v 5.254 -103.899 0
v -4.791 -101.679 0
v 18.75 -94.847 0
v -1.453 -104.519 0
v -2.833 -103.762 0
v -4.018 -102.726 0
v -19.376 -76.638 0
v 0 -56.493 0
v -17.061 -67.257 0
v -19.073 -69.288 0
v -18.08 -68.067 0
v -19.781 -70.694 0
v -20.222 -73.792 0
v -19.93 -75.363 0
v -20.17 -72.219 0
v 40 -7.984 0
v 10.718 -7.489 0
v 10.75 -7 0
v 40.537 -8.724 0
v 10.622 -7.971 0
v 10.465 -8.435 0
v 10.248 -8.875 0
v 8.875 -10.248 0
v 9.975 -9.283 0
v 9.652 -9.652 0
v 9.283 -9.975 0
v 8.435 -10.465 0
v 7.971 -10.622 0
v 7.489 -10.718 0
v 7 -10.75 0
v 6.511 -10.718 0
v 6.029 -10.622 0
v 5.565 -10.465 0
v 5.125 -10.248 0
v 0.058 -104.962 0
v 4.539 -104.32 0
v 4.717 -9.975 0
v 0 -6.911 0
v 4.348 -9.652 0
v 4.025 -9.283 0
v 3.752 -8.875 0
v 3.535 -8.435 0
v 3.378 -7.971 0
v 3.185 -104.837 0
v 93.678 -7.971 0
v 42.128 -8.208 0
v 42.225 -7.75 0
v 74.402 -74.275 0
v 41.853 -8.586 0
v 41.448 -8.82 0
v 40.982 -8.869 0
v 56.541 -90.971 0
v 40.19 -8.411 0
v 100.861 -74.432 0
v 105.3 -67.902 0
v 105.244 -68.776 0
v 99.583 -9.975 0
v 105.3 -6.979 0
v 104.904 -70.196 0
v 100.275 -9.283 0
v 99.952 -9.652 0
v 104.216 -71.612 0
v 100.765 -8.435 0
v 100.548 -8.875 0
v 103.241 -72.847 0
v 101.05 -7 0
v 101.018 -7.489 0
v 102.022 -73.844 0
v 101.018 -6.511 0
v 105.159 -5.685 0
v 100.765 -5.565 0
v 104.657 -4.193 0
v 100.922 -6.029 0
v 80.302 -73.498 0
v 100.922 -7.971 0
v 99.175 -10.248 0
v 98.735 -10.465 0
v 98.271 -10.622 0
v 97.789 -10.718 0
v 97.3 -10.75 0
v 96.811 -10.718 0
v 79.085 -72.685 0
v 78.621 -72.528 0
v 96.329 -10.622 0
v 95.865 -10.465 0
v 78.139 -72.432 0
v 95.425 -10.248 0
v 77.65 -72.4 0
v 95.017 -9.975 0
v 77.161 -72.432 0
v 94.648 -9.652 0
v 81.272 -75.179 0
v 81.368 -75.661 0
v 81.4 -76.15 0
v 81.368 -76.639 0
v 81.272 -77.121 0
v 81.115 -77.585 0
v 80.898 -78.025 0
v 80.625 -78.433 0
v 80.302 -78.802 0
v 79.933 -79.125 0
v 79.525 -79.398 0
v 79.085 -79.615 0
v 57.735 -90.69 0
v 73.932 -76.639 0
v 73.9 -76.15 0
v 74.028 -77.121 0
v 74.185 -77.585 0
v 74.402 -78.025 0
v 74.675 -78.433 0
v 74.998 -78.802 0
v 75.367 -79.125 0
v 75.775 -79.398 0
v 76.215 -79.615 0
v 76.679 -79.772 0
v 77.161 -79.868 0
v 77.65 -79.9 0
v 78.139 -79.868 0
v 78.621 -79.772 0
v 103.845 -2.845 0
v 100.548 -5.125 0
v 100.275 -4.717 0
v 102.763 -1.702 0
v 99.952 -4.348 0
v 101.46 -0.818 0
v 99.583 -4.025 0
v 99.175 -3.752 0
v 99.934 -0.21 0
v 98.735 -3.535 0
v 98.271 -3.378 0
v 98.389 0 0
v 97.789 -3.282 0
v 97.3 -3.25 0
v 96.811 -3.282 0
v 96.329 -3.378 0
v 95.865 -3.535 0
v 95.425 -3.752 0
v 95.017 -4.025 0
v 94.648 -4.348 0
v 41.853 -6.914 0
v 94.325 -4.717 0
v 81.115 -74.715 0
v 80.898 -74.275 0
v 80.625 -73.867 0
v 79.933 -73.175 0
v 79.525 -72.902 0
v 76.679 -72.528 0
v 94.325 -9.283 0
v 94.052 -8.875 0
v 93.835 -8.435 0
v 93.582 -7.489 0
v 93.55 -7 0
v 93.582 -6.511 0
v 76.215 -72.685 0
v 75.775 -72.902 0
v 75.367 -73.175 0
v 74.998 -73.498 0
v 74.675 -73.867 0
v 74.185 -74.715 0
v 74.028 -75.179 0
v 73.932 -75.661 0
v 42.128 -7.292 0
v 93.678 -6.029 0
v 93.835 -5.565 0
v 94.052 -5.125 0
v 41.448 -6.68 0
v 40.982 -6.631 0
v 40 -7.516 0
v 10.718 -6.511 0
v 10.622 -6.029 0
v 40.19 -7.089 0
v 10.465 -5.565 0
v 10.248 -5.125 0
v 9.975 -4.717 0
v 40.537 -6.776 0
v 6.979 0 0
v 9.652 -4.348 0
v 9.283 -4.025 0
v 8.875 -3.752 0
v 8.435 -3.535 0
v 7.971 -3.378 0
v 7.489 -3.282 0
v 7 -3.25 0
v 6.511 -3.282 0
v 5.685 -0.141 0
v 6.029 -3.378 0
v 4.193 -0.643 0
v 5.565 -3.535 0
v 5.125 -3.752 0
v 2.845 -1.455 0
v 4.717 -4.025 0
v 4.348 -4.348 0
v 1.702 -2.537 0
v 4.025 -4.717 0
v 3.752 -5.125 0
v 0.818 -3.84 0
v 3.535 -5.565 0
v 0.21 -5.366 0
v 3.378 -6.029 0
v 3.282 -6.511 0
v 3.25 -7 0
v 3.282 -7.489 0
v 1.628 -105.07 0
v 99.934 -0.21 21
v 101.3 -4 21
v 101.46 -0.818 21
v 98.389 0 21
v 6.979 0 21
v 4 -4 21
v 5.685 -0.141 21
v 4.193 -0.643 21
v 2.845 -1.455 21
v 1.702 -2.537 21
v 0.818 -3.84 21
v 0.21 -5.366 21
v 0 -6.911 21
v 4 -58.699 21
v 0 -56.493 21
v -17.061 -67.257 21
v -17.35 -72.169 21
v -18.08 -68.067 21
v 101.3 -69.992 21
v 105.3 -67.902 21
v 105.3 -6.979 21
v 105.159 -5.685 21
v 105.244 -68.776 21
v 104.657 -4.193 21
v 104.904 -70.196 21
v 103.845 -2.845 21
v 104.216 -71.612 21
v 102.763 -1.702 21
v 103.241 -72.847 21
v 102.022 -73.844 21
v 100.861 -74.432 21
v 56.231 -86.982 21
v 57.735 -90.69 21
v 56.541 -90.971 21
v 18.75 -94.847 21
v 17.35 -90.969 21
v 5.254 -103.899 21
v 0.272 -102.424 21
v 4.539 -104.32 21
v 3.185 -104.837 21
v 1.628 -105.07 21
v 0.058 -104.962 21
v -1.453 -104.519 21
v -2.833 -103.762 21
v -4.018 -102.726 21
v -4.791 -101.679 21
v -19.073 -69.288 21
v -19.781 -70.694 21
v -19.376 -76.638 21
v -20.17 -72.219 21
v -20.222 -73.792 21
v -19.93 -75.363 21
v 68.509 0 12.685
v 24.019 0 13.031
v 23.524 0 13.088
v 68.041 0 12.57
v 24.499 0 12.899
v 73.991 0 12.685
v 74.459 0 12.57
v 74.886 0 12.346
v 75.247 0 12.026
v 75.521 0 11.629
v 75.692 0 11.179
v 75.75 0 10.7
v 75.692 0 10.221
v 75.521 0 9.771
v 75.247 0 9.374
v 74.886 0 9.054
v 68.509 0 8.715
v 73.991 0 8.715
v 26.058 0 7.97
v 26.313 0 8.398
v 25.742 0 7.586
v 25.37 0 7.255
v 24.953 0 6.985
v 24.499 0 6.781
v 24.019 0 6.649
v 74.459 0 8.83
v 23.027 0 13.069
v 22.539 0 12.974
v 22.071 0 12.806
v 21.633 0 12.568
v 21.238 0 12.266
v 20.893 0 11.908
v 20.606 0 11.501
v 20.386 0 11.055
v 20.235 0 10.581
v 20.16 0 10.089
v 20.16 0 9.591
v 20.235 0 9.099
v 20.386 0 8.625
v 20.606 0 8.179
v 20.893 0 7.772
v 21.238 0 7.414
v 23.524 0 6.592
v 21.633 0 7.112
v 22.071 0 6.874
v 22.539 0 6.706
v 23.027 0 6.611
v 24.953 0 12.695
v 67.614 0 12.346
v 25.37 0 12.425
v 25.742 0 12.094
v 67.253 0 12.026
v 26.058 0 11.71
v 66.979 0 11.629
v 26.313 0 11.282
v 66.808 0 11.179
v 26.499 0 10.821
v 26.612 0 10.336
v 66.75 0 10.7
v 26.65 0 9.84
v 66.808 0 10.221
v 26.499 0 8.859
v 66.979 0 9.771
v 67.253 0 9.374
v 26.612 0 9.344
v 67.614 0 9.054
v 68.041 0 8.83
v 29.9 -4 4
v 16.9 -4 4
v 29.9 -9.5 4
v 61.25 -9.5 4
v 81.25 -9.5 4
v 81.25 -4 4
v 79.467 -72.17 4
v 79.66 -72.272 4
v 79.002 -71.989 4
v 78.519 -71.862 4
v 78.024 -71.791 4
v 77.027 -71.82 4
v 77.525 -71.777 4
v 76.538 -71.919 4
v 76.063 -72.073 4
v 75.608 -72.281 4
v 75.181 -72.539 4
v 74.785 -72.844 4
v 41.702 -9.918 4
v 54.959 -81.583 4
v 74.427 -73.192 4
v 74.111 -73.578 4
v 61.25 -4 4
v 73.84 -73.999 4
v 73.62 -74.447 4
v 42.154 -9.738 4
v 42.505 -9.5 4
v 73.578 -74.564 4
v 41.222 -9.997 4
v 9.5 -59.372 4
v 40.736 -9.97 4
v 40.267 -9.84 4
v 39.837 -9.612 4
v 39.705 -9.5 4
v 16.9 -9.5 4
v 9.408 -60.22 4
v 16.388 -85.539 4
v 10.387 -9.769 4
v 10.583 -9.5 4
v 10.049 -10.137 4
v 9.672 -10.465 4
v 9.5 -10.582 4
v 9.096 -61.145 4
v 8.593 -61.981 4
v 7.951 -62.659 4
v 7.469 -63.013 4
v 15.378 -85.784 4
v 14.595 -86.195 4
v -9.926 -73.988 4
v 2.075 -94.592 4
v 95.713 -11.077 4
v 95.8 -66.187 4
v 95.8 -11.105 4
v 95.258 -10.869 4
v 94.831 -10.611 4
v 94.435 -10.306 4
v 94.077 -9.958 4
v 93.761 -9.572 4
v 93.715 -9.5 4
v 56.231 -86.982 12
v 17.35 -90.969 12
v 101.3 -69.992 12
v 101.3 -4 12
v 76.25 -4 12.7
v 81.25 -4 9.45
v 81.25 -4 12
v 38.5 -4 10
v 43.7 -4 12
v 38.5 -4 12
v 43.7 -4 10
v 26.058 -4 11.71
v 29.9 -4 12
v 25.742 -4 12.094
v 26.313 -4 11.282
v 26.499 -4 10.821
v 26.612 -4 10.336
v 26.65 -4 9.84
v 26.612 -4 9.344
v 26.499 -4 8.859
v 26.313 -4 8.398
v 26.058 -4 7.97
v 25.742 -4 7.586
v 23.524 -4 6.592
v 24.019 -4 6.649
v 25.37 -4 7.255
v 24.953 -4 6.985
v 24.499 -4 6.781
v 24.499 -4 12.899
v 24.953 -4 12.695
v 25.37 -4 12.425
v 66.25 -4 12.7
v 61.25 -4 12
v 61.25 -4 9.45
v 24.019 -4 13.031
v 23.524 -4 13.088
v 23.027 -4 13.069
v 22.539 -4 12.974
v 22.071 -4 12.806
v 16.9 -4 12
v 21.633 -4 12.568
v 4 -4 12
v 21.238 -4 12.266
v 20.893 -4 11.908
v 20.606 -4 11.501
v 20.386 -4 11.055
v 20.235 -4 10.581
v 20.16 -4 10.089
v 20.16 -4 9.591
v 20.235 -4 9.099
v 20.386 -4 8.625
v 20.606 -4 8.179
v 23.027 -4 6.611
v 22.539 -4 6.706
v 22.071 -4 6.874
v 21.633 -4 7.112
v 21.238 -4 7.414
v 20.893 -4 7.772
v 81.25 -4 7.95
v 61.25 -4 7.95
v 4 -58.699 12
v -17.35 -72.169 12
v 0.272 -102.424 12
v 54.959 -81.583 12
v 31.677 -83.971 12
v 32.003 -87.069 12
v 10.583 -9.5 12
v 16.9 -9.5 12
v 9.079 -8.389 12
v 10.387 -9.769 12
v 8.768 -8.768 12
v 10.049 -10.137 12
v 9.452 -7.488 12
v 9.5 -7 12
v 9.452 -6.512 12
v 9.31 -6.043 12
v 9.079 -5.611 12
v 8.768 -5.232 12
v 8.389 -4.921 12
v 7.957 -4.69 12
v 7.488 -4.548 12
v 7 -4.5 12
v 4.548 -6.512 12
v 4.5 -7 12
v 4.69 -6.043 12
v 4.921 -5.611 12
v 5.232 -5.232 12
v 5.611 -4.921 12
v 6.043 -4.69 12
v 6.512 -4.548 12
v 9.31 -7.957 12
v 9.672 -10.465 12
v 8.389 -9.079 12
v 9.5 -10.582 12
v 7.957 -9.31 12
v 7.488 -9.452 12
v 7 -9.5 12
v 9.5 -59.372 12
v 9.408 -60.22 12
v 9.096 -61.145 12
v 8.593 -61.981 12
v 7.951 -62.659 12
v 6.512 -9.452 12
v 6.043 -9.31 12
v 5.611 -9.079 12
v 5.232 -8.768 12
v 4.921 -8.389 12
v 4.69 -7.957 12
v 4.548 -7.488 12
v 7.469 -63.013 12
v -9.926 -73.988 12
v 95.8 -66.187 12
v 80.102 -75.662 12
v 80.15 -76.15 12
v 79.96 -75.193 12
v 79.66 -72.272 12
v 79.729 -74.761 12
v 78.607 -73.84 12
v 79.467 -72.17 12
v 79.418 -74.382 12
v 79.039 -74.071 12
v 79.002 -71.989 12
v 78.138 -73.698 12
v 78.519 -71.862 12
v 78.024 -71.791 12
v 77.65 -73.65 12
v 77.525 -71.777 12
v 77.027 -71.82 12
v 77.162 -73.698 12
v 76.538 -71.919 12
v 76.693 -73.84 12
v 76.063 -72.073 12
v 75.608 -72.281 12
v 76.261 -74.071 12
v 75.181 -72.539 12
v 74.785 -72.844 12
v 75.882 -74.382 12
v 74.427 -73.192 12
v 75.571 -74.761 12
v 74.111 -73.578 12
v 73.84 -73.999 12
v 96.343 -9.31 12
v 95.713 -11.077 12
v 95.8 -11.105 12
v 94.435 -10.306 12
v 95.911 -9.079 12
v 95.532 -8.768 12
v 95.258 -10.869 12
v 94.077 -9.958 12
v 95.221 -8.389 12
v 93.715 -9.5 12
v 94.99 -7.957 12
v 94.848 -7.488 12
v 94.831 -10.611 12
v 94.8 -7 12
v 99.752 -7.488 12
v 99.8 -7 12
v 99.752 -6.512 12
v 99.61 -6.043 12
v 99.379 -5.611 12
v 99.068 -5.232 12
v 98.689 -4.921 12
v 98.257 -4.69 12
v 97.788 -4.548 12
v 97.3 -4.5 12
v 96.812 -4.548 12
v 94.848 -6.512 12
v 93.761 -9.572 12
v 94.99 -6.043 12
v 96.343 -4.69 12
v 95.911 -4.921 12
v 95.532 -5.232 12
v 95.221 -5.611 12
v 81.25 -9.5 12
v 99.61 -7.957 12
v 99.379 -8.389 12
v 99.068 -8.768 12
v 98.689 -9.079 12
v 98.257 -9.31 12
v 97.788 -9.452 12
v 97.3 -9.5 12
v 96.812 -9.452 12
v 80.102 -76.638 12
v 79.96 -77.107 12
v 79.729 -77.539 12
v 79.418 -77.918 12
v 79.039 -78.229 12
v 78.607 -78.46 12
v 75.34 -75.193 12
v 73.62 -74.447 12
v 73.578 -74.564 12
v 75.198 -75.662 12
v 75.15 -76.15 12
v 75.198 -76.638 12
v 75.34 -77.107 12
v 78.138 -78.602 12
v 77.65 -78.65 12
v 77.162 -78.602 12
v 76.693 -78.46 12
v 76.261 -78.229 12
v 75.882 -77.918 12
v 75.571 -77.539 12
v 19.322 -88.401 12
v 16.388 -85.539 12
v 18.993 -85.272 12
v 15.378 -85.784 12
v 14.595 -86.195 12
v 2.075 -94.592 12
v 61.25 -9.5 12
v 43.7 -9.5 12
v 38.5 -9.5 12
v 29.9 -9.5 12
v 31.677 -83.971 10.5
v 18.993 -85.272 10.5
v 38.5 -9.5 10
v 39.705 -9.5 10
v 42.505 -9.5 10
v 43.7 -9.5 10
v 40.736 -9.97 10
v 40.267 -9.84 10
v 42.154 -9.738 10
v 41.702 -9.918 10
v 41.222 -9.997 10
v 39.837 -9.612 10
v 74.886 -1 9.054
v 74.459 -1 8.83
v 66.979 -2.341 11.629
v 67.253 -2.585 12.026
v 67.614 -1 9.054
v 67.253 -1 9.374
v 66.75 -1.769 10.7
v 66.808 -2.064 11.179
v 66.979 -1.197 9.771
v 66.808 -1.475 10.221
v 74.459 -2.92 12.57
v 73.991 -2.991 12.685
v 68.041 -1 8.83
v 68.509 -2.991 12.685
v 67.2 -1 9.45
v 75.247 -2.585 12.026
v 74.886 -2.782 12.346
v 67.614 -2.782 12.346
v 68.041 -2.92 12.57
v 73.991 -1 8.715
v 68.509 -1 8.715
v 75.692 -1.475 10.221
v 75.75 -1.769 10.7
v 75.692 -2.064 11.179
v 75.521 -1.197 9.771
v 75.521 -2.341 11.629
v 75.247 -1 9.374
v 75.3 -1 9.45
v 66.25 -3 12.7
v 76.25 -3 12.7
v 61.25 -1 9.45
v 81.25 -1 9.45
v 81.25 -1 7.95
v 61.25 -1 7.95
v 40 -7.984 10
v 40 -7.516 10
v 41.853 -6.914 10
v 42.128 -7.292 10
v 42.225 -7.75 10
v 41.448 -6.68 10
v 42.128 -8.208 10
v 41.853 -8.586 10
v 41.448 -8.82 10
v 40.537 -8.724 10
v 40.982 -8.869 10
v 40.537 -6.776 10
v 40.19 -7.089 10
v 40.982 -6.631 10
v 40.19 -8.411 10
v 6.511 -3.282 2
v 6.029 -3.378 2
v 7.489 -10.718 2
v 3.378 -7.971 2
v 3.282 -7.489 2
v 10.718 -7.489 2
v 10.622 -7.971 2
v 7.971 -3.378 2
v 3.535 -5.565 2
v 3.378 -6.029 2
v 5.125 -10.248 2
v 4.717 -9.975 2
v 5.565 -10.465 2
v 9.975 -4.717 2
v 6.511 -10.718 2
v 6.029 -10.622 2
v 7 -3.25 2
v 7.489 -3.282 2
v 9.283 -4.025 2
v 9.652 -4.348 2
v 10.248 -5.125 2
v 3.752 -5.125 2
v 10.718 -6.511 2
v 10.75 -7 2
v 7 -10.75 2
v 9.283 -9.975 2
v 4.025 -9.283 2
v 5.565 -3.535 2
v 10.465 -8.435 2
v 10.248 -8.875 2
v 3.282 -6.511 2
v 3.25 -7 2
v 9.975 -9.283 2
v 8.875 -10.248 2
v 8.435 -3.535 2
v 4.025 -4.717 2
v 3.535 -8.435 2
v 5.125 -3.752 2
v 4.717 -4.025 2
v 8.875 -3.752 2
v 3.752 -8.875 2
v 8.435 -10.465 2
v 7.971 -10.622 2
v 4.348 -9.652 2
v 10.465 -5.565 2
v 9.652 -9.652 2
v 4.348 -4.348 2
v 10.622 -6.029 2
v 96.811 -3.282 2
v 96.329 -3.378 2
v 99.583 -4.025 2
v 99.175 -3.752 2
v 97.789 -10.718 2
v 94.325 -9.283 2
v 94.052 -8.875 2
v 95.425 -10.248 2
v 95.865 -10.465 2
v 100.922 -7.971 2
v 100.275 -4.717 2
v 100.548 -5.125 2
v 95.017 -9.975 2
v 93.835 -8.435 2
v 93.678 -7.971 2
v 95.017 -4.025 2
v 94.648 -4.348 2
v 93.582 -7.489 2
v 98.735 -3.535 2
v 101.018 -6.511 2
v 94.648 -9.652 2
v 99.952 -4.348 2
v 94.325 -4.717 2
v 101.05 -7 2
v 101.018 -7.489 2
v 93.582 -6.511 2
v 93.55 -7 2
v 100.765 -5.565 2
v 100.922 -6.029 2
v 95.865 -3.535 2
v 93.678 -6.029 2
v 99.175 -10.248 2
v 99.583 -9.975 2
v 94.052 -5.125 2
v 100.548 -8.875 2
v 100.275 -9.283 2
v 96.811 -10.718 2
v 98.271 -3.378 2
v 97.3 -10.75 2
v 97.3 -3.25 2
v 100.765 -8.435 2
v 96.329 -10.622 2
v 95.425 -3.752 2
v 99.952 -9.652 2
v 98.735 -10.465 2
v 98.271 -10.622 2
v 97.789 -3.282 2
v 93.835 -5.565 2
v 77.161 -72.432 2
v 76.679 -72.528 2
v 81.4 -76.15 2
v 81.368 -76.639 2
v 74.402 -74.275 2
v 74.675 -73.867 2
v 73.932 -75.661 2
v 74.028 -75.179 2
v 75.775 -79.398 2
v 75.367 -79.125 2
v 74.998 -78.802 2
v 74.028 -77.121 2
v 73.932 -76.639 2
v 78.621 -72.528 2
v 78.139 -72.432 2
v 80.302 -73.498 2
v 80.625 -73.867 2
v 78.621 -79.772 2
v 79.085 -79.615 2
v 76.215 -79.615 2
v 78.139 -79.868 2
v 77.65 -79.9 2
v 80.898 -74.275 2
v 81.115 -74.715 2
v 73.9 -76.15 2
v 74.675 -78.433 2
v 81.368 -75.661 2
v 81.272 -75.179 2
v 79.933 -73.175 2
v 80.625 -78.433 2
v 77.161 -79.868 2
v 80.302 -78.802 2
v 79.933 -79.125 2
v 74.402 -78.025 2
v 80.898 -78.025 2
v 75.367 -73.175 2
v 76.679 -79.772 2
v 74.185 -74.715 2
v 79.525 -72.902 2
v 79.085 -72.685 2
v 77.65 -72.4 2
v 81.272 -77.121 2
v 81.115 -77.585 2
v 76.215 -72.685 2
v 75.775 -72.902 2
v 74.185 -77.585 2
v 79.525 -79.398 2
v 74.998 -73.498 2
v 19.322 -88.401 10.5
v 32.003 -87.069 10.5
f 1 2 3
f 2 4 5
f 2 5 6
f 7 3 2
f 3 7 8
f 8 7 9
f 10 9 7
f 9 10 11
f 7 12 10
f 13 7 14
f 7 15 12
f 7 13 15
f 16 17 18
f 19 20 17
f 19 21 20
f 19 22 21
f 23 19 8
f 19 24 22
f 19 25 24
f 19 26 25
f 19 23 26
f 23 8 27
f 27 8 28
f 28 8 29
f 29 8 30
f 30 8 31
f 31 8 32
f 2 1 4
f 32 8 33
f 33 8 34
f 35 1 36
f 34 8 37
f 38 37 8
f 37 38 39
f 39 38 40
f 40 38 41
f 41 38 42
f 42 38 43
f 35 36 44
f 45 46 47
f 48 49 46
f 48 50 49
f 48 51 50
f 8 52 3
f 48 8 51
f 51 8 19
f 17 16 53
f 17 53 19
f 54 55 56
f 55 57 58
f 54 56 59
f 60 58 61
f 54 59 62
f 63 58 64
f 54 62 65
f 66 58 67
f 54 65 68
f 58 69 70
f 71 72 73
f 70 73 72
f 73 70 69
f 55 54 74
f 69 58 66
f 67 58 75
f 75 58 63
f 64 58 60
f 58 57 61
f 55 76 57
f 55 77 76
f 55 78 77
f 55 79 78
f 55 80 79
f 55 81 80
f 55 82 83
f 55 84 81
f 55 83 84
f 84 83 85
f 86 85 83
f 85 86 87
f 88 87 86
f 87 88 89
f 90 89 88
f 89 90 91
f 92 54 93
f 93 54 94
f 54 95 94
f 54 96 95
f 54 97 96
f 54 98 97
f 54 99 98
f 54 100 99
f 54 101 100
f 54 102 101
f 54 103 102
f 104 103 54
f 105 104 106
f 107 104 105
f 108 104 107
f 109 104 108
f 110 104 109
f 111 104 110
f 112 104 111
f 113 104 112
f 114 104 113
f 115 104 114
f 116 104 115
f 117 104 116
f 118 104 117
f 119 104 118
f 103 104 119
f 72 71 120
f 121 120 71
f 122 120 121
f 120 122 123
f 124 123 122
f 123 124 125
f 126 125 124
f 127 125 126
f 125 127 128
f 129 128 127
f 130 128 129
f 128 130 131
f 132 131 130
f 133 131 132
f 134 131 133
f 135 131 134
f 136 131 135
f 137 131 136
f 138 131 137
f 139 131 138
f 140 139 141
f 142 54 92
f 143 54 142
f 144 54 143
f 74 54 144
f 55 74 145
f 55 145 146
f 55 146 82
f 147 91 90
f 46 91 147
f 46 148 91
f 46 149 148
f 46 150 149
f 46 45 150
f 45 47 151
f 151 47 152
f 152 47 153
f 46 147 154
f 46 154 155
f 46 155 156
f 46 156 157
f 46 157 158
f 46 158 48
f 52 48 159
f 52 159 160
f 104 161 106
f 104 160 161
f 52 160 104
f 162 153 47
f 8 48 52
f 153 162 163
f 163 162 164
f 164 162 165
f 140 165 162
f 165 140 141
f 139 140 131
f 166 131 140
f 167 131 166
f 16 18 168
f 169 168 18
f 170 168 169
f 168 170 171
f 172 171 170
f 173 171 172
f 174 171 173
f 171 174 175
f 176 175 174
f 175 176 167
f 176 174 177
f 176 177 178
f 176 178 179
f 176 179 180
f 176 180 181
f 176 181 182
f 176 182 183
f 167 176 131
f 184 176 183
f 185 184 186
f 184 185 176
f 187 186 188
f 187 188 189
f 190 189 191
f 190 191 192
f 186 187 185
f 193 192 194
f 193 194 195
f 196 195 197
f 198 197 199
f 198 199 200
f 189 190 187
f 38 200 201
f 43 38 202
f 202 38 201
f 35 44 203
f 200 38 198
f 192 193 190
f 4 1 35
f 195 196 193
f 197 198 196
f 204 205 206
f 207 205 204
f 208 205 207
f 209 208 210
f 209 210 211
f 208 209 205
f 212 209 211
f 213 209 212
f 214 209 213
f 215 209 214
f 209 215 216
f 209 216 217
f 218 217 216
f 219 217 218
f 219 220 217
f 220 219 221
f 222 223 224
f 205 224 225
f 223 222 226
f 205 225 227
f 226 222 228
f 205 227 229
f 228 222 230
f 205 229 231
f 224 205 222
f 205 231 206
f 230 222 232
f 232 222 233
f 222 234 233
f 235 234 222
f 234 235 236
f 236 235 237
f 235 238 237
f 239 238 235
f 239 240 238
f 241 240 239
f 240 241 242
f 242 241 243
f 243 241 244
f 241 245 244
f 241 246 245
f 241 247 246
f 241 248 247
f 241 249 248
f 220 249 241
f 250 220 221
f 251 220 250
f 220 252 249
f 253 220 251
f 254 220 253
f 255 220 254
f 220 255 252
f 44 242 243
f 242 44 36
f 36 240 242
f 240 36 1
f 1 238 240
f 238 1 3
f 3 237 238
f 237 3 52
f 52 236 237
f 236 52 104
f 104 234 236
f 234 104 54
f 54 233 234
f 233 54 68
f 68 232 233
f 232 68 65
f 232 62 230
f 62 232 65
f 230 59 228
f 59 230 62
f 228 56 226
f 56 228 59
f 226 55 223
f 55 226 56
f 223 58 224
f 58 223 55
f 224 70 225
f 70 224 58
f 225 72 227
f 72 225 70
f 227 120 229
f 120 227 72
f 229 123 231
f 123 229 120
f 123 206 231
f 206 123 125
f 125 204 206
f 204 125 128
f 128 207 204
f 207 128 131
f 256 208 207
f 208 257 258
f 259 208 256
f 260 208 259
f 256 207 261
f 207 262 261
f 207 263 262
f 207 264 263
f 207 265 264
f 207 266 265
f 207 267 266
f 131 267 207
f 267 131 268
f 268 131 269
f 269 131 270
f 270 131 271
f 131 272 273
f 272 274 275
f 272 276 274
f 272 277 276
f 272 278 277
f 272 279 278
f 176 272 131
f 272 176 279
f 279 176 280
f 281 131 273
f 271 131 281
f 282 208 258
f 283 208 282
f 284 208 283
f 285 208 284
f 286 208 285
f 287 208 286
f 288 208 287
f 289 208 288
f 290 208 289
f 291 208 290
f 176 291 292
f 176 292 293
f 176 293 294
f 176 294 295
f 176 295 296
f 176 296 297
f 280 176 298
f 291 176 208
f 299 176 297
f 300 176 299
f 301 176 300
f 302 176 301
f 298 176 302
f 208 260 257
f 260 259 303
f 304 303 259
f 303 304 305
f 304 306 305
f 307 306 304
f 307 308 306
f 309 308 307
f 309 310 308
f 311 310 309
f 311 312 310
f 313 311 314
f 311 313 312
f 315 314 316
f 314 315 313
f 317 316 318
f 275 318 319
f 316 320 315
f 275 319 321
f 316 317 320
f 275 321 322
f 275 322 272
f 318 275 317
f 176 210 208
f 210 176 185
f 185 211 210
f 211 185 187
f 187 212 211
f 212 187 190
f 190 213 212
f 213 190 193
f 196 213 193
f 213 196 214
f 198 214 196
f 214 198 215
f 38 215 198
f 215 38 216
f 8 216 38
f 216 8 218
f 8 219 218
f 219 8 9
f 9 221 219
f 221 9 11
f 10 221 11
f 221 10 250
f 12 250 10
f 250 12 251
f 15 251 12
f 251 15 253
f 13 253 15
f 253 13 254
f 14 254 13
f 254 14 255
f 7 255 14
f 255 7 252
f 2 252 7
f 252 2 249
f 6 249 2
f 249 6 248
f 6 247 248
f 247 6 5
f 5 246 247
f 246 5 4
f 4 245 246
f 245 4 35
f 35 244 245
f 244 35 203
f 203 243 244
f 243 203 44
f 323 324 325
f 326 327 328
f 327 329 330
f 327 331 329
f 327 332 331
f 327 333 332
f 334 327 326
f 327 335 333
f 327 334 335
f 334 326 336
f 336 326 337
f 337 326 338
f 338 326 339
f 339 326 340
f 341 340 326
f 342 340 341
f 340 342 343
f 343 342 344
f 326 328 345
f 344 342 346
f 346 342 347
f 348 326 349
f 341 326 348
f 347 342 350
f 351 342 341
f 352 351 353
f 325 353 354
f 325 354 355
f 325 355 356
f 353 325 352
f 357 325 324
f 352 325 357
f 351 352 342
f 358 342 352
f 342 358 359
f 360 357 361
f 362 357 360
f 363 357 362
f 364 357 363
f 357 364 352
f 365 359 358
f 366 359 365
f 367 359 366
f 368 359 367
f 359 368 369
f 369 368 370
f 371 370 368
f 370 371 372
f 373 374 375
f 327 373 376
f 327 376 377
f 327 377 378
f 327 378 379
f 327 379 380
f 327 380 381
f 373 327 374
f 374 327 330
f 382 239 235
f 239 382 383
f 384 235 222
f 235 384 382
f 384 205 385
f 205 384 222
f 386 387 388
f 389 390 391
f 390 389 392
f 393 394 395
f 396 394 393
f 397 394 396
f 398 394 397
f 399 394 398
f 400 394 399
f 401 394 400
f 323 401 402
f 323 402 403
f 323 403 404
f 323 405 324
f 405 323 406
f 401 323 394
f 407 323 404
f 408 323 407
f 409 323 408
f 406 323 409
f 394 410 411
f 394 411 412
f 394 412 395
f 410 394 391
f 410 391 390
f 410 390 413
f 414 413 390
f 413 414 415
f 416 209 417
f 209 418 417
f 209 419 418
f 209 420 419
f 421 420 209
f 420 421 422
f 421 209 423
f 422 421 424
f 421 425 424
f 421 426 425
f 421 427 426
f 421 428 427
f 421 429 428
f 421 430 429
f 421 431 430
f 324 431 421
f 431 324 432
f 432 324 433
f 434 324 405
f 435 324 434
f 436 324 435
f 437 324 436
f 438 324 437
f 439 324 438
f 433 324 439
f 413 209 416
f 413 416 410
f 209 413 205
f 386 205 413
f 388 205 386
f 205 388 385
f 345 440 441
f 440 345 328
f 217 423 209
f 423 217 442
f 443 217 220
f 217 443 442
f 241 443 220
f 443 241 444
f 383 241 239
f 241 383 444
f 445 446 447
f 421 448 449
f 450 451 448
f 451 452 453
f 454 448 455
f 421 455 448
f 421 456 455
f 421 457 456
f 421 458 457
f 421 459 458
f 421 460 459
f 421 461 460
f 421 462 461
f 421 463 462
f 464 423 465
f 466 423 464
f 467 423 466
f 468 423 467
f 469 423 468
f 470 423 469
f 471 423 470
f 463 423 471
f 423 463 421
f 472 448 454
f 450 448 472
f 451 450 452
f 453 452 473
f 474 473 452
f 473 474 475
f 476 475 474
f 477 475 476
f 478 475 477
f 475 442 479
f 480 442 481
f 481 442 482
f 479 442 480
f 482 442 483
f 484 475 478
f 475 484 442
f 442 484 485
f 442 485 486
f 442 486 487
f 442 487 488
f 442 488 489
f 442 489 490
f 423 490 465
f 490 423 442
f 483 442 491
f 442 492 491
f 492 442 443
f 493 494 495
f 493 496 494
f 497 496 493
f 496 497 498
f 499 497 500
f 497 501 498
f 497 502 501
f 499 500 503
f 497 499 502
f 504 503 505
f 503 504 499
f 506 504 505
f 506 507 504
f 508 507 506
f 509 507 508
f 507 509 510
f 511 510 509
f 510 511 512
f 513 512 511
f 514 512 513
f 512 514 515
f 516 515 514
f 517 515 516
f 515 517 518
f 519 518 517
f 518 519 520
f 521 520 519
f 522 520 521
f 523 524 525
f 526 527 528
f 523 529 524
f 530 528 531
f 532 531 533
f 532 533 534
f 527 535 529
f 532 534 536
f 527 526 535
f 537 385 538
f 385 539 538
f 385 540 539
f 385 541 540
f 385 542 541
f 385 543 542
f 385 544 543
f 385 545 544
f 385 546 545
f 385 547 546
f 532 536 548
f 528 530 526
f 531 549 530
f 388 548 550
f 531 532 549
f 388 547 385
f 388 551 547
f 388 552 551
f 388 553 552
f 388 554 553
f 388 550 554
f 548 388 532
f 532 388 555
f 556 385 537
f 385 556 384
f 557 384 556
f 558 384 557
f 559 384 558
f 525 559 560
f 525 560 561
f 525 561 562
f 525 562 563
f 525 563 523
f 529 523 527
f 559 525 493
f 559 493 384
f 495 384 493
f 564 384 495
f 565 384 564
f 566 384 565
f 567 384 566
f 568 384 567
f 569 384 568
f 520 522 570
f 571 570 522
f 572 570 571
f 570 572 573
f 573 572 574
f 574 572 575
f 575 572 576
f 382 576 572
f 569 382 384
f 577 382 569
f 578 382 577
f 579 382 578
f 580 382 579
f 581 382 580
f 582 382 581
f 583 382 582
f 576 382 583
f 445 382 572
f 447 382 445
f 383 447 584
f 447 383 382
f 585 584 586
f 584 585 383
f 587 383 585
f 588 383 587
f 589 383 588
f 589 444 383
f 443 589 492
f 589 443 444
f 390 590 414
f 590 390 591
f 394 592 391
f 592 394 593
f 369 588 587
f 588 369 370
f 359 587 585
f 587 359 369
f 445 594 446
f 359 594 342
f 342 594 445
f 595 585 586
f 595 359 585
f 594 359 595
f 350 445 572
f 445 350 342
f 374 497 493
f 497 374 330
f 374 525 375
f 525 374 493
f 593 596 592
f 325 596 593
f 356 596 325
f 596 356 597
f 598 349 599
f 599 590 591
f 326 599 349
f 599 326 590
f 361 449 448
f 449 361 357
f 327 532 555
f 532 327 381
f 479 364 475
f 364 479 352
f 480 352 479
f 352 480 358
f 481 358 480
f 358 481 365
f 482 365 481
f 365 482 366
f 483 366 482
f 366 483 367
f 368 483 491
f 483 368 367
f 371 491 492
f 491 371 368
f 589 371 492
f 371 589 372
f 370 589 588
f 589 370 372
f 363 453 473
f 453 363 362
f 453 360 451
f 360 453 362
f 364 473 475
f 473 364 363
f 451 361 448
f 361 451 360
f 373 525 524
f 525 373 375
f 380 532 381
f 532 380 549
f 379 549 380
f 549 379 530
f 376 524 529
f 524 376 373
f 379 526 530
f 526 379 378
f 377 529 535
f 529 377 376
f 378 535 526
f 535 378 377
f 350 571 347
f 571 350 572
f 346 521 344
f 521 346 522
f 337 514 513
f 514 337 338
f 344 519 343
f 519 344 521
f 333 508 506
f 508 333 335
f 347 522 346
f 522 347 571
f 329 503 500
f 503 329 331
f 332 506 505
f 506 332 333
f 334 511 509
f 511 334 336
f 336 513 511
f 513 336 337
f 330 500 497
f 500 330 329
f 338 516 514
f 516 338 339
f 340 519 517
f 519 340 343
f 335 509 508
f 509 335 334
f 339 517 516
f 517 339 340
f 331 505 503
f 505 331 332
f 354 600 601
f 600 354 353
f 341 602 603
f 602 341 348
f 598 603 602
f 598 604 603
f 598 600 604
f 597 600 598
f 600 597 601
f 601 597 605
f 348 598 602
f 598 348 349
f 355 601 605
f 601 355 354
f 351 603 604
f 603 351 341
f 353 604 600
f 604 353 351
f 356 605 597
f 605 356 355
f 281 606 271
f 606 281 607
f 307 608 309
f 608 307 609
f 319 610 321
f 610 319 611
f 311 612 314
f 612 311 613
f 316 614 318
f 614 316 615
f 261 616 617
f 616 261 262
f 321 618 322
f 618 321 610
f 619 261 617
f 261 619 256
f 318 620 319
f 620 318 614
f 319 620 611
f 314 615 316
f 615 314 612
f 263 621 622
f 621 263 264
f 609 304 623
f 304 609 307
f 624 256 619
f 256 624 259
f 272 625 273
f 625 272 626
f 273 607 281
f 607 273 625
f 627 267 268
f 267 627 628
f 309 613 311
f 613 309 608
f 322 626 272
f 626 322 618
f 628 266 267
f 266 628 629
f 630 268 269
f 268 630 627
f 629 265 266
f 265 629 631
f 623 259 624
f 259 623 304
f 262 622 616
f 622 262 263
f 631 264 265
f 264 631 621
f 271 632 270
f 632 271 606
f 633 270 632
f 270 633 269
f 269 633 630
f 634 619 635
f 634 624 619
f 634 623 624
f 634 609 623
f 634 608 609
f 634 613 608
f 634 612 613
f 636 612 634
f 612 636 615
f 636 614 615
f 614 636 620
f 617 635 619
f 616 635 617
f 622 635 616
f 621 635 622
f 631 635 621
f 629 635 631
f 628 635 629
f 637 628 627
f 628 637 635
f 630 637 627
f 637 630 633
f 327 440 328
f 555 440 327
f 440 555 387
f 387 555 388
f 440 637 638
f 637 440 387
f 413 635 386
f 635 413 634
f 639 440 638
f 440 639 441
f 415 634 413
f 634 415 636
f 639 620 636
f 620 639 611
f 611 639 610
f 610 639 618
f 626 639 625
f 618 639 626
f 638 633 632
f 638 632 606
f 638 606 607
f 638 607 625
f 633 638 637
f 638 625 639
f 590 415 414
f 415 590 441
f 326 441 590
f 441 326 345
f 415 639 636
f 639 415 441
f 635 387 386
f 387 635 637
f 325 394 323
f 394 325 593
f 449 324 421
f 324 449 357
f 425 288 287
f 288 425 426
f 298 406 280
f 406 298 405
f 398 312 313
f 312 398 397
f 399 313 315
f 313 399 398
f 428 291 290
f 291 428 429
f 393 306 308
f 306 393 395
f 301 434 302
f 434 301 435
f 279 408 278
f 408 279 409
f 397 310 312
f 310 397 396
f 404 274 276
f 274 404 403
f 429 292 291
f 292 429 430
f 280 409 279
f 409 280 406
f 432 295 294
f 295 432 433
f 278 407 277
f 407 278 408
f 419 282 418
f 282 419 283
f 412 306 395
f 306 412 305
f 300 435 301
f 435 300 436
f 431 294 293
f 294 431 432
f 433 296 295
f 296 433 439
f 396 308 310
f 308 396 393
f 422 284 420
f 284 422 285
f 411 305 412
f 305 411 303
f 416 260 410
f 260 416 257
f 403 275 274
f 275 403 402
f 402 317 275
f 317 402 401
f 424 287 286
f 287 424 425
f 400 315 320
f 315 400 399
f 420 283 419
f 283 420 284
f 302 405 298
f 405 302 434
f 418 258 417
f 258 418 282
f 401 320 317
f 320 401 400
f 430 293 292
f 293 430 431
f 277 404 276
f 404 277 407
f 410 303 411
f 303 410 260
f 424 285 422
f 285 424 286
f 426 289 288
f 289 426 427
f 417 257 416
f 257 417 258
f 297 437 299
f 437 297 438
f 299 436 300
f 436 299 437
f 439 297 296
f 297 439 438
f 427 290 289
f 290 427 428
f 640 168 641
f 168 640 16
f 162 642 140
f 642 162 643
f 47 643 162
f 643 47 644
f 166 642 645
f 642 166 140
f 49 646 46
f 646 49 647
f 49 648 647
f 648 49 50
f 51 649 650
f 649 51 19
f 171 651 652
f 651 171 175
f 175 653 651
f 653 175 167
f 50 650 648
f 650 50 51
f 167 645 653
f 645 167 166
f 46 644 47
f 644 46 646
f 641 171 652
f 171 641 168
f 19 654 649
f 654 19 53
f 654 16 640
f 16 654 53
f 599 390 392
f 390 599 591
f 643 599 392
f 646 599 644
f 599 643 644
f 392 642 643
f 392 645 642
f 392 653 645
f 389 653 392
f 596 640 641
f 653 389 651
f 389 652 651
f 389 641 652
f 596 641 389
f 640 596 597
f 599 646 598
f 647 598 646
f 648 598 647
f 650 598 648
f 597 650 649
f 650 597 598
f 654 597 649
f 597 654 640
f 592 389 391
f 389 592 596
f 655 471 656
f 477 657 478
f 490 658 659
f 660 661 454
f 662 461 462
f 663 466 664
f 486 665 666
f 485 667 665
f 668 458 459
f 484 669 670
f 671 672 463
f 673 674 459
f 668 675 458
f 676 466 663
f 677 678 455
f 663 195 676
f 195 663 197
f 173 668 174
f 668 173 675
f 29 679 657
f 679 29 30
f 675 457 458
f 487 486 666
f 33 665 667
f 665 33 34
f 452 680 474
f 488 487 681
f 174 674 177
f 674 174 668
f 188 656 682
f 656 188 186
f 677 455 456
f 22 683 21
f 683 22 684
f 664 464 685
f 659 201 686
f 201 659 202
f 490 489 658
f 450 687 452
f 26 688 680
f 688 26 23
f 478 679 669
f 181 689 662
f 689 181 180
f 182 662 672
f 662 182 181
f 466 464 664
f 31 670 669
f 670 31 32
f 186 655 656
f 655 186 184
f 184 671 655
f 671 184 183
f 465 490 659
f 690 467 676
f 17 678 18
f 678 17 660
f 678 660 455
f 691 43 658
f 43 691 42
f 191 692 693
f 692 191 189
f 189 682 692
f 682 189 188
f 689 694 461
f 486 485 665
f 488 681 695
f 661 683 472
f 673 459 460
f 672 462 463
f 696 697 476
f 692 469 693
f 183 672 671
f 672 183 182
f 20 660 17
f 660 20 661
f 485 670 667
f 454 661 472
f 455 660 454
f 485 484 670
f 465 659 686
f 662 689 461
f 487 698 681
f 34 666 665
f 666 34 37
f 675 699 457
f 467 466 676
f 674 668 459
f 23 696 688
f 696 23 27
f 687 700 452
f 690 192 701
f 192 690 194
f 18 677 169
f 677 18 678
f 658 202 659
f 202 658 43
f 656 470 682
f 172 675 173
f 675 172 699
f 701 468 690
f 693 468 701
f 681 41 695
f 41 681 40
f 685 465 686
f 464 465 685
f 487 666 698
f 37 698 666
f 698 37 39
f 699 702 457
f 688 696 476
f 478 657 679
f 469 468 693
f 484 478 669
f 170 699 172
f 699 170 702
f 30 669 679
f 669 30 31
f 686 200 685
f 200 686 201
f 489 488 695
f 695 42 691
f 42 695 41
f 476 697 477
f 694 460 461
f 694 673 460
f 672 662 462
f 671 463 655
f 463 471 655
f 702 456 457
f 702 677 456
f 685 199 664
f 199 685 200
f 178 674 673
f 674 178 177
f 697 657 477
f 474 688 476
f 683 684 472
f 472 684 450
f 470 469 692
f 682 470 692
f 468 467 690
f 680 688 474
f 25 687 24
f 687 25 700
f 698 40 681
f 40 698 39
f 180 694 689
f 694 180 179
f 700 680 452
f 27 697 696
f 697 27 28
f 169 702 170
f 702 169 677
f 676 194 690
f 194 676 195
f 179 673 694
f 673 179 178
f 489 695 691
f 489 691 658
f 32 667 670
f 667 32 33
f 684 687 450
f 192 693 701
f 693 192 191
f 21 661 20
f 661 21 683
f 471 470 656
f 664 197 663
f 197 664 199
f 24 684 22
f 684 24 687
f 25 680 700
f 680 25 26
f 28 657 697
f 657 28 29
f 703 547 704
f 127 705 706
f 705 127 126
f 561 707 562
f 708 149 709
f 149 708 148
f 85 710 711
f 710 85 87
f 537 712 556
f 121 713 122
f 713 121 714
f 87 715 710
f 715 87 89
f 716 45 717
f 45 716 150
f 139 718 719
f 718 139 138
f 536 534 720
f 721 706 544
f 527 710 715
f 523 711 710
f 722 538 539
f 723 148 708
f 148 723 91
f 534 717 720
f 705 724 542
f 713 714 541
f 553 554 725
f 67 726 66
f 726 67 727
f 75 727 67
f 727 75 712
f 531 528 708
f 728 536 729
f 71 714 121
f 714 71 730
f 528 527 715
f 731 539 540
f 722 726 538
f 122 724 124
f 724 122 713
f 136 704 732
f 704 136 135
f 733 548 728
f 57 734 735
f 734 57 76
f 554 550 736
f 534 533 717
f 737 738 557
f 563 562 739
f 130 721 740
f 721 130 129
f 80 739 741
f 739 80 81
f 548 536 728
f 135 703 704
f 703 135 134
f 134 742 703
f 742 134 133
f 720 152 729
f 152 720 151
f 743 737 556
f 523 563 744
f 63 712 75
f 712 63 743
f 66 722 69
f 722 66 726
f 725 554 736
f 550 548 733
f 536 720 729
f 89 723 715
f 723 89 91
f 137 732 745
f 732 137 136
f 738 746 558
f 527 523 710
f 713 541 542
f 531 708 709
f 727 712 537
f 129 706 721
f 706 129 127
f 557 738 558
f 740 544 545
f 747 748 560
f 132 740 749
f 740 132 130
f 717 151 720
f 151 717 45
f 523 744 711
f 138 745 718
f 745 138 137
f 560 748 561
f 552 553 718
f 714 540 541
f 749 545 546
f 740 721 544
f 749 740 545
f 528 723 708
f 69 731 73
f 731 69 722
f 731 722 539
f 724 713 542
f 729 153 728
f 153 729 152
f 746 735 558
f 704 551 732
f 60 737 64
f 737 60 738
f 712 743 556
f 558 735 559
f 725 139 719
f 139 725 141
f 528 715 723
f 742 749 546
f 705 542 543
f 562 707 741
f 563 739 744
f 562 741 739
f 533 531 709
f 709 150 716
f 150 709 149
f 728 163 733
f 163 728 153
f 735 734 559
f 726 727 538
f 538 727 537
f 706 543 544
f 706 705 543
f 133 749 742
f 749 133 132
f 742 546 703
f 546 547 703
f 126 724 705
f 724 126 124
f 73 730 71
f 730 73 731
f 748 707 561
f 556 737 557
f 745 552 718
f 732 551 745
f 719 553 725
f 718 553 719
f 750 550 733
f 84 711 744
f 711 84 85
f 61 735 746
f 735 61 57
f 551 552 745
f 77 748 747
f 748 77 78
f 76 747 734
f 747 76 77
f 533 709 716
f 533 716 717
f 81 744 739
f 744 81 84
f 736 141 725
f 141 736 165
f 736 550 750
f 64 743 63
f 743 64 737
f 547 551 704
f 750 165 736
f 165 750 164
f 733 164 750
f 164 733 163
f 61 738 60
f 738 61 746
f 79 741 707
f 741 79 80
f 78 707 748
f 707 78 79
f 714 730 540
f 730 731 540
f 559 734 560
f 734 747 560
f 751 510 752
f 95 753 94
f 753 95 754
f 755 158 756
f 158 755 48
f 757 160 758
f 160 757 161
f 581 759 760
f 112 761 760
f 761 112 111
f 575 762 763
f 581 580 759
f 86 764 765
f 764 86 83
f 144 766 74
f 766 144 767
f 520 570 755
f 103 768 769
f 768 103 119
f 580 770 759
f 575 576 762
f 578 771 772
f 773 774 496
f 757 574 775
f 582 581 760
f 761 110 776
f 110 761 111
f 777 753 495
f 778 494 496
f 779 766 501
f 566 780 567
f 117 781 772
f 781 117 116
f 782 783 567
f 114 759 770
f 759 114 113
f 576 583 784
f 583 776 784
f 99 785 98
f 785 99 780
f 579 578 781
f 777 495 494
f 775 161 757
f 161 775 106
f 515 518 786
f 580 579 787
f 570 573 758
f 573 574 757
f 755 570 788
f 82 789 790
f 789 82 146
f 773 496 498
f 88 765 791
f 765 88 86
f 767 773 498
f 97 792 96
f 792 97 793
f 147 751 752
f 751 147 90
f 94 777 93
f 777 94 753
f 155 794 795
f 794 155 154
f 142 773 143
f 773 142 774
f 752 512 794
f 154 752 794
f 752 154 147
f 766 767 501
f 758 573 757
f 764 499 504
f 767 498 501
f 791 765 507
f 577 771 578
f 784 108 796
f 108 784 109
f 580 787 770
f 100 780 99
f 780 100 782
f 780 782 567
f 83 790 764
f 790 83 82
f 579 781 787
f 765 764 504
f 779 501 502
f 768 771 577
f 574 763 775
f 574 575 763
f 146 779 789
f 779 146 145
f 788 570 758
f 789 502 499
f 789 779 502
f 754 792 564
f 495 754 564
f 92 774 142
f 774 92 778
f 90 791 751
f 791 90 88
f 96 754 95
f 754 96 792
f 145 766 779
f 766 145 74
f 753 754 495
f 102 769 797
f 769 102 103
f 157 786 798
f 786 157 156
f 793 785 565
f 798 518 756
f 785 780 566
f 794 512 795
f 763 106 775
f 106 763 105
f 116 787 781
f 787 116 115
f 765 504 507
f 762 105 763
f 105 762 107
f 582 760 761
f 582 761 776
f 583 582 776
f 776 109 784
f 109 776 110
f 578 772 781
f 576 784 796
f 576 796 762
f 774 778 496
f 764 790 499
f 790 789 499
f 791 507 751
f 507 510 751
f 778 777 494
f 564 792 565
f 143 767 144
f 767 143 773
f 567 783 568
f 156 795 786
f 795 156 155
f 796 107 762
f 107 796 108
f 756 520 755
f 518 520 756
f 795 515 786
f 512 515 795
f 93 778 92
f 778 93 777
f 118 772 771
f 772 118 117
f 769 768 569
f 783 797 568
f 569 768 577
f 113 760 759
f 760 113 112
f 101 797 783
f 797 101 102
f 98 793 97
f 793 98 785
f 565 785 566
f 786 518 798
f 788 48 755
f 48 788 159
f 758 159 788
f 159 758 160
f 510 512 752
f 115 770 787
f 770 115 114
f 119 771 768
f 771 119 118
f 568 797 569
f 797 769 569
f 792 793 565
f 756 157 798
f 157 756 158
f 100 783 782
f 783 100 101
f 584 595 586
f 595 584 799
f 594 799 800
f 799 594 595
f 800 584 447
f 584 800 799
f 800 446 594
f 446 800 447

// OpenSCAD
/******************************************************************************/
/*
  This file is part of the package minidox-case. It is subject to the
  license terms in the LICENSE file found in the top-level directory
  of this distribution and at:

    https://github.com/pjones/helping-mic

  No part of this package, including this file, may be copied, modified,
  propagated, or distributed except according to the terms contained in
  the LICENSE file.
*/

/******************************************************************************/
$fa = 1.0;
$fs = 0.5;

/******************************************************************************/
/*
  Note: All of the measurements in this file are for the RIGHT side.
  To generate the left side the model is mirrored in the X axis.
*/

/******************************************************************************/
// These are set from the command line:
print_side = "right";           /* right or left */
print_part = "case";            /* case, top, or cover */

/******************************************************************************/
// Optional features:
feature_cover = false;           /* Will you use a cover? */
feature_magnets = false;         /* Add holes to hold magnets? */

/******************************************************************************/
// Settings you may want to tweak:
inner_depth = 9.0;              /* How high the case will come up from the board upward. */
inner_spacing = 2.25;           /* Space under the board to hold it. */
outer_spacing = 1.0;            /* Extra space in the case for the board to fit in. */
cover_inner_space = 0.0;        /* Extra space in the cover for cables, etc. */
board_thickness = 1.6;          /* Thickness of circuit board. */
switch_height = 11.75;          /* Space between top of board and bottom of key cap */
cap_height = 7.90;              /* Height of keycap. */
bolt_size = [3.0, 16.0];        /* M3x16 */
bolt_inset = 2.5;               /* From wall to center of bolt. */
bolt_shaft_wall = 2.0;          /* Wall thickness of shaft bolt screws into. */
bolt_recess = 2.0;              /* How deep bolts go into the bottom. */

/******************************************************************************/
// If using magnets to hold the cover on, fill these out and add a
// small amount of extra so the magnet can go in easily.
//
// The exact measurements of the magnets I'm using are:
//   7.95mm x 2.80mm;
magnet_diameter = 8.25;         /* Magnet diameter. */
magnet_depth = 3.00;            /* Magnet depth. */

/******************************************************************************/
// I don't recommend changing these:
rounding = 2.25;                /* How much rounding to apply. */
thickness = 4;                  /* Wall thickness. */
board_overlap = 1.8;            /* Space around the board the top can sit on */

/******************************************************************************/
// Points that outline the desired case shape:
outline = [
  [0.00,     0.00],
  [95.30,    0.00],
  [95.30,  -64.30],
  [51.00,  -81.00],
  [12.00,  -85.00],
  [-4.40,  -96.00],
  [-21.00, -67.50],
  [0.00,   -54.25],
];

/******************************************************************************/
// Points that outline the shape to cut out of the top so the key caps
// can poke through:
cap_1U = [18.25, 18.25, 0.85, 0.85];
cap_2U = [cap_1U[0], 32.75, 0.85, 0.85];

rows = 3;
columns = 5;

function cap_over(keys) =
  /* Size of keycaps + Size of space between them */
  (cap_1U[0] * keys) + (cap_1U[2] * keys);

function cap_back(keys) =
  cap_over(columns) - (cap_over(keys - 1) + (keys == 1 ? 0 : cap_1U[2]));

function column_over(column, base) = lookup(column, [
    [ 1, -4.00 ],
    [ 2, -2.00 ],
    [ 3, -0.00 ],
    [ 4, -2.00 ],
    [ 5, -7.00 ],
  ]) + base;

// Position the entire cut out by placing the center of column in the
// center of the inner case.
cap_x_mid = max([for (i = outline) i[0] + outer_spacing])/2;
cap_x_start = cap_x_mid - (cap_over(3) - cap_1U[0]/2 - cap_1U[2]/2) - 0.25;

cap_y_upper = -0.25;
cap_y_lower = cap_y_upper + -(cap_1U[1] * rows + cap_1U[3] * rows);

top_cut = [
  // Upper half:
  [cap_x_start, column_over(1, cap_y_upper)], // Left of Y
  [cap_over(1), column_over(1, cap_y_upper)], // Left of U
  [cap_over(1), column_over(2, cap_y_upper)], // Left of U (moved up)
  [cap_over(2), column_over(2, cap_y_upper)], // Left of I
  [cap_over(2), column_over(3, cap_y_upper)], // Left of I (moved up)
  [cap_over(3), column_over(3, cap_y_upper)], // Left of O
  [cap_over(3), column_over(4, cap_y_upper)], // Left of O (moved down)
  [cap_over(4), column_over(4, cap_y_upper)], // Left of P
  [cap_over(4), column_over(5, cap_y_upper)], // Left of P (moved down)
  [cap_over(5), column_over(5, cap_y_upper)], // Right of P

  // Lower half:
  [cap_back(1), column_over(5, cap_y_lower)], // Right of /
  [cap_back(2), column_over(5, cap_y_lower)], // Left of /
  [cap_back(2), column_over(4, cap_y_lower)], // Left of / (moved up)
  [cap_back(3), column_over(4, cap_y_lower)], // Left of .
  [cap_back(3), column_over(3, cap_y_lower)], // Left of . (moved up)
  [cap_back(4), column_over(3, cap_y_lower)], // Right of M
  [cap_back(4), column_over(2, cap_y_lower)], // Right of M (moved down)
  [cap_back(5), column_over(2, cap_y_lower)], // Right of N
  [cap_back(5), column_over(1, cap_y_lower)], // Right of N (moved down)
  [cap_x_start, column_over(1, cap_y_lower)], // Left of N
];

// Now the three thumb keys:
thumb_3 = [ cap_x_mid - 7.40  // x offset (center of cap)
          , 71.35             // y offset (center of cap)
          , 0.00              // rotation (counterclockwise)
          ];

thumb_2 = [ thumb_3[0] - 21.25
          , thumb_3[1] + 2.40
          , 15.00
          ];

thumb_1 = [ thumb_2[0] - 24.00
          , thumb_2[1] + 2.30
          , 30.0
          ];

/******************************************************************************/
// Size of the pro micro body and TRRS jack.
//
// Elements:
//  - x size
//  - y size
//  - z size
//  - x offset to center of device
//  - z offset to center of device's opening measured from the bottom
//    of the circuit board to the center of the opening.
//
pro_micro = [ 20.0
            , 34.0
            , 6.0 // Used to set the inner height of the case.
            , 66.75
            , print_side == "right" ? 1.3 : 4.5
            ];

trrs = [ 13.0
       , 13.0
       , 5.23
       , 18.90
       , 2.16
       ];

/******************************************************************************/
// Other computed values:
board_to_caps = switch_height + cap_height;
wall_thickness_no_padding = feature_cover ? thickness * 2 : thickness;
wall_thickness = wall_thickness_no_padding + outer_spacing/2;
bolt_shaft = bolt_size[0] + bolt_shaft_wall;
shelf_width = inner_spacing + outer_spacing + rounding;

/******************************************************************************/
reset_button = [ 5.2            /* x */
               , shelf_width    /* y */
               , 2              /* z */
               , 36.6           /* center of x */
               , 3.25           /* center of y */
               , 2.25           /* diameter of reset hole */
               ];

/******************************************************************************/
// How high to make the shelf that the board sits on:
inner_height = pro_micro[2] + 2.0;
echo("INNER HEIGHT: ", inner_height);

/******************************************************************************/
// Full case height:
outer_height = inner_height + inner_depth;
echo("OUTER HEIGHT:", outer_height);

/******************************************************************************/
// How big the cover needs to be to enclose everything:
cover_inner_height =
  board_to_caps + board_thickness + // Everything from the shelf upwards
  thickness +                       // To include the top wall of the cover
  cover_inner_space -               // And extra space
  (inner_depth + thickness);        // Remove space used by case and top

echo("COVER INNER HEIGHT:", cover_inner_height);

/******************************************************************************/
// How big is the cover on the outside:
cover_outer_height = cover_inner_height + thickness + outer_height/2;
echo("COVER OUTER HEIGHT:", cover_outer_height);

/******************************************************************************/
case_width = max([ for (i = outline) i[0] ]) +
  ((outer_spacing + thickness)*2) +
  (feature_cover ? thickness*2 : 0);

case_y_width = min([ for (i = outline) i[1] ]) * -1;

cover_wall_height = outer_height/2 + thickness;

/******************************************************************************/
module cover_wall(height) {
  difference() {
    // The outer wall the case sits on.
    linear_extrude(height=height)
      offset(delta=outer_spacing + thickness*2)
      offset(r=+rounding) offset(delta=-rounding)
      polygon(points=outline);

    // Cut the wall off the back so device access isn't limited.
    translate([ case_width/2
              , thickness + outer_spacing + thickness/2
              , height/2
              ])
      cube([case_width*2, thickness, height+2], center=true);
  }
}

/******************************************************************************/
module outer_case() {
  difference() {
    union() {
      // Outer wall:
      linear_extrude(height=outer_height + thickness)
        offset(delta=outer_spacing + thickness)
        offset(r=+rounding) offset(delta=-rounding)
        polygon(points=outline);

      // Lower outer wall for case to sit on:
      if (feature_cover) cover_wall(cover_wall_height);
    }

    // Inner wall cutaway:
    translate([0, 0, thickness])
      linear_extrude(height=outer_height + thickness)
      offset(delta=outer_spacing)
      polygon(points=outline);
  }
}

/******************************************************************************/
module inner_case() {
  difference() {
    // Inside shelf:
    translate([0, 0, thickness])
      linear_extrude(height=inner_height)
      offset(delta=outer_spacing)
      polygon(points=outline);

    // Cut out most of the floor leaving the shelf:
    translate([0, 0, thickness])
      linear_extrude(height=inner_height)
      offset(delta=-inner_spacing)
      offset(r=-rounding)
      polygon(points=outline);
  }
}

/******************************************************************************/
// Carve out space for a device and its opening.
//
//  The opening shape should come in as a child and should have its
//  center on the z axis.  This assumes the opening is in the center
//  of the device.
module back_wall_device(dims) {
  center_x_offset = wall_thickness + dims[3];

  translate([ center_x_offset - dims[0]/2
            , -(dims[1] + wall_thickness_no_padding)
            , thickness
            ])
  cube([ dims[0]
       , dims[1]
       , outer_height
       ]);

  // Cutout for the connector.
  translate([ center_x_offset
            , 0
            , thickness + inner_height - dims[4]
            ]) children();
}

/******************************************************************************/
module pro_micro_cutout() {
  connector_z = 4.0;
  connector_x = 9.0;
  board_y = 3;
  board_z = 1.5;

  // Right-hand pro micro is upside down.
  board_z_offset = print_side == "right"
    ? -(connector_z/2)
    : connector_z/2;

  back_wall_device(pro_micro) {
    translate([0, -(wall_thickness/2), 0])
      rotate([90, 0, 0])
      hull() {
        translate([-(connector_x/2 - connector_z/2), 0, 0])
        cylinder(d=connector_z, h=wall_thickness, center=true);
        translate([(connector_x/2 - connector_z/2), 0, 0])
        cylinder(d=connector_z, h=wall_thickness, center=true);
      }

    hull() { // This hull should allow printing without supports.
      translate([0, -(wall_thickness_no_padding), 0])
        cube([pro_micro[0]/2, wall_thickness_no_padding/2, connector_z], center=true);
      translate([0, board_y/2 - wall_thickness_no_padding, board_z_offset])
        cube([pro_micro[0], board_y, board_z], center=true);
    }
  }
}

/******************************************************************************/
  // Cut out for the TRRS jack:
module trrs_cutout() {
  back_wall_device(trrs) {
    translate([0, -(wall_thickness/2), 0])
      rotate([90, 0, 0])
      cylinder(d=6.5, h=wall_thickness, center=true);
  }
}

/******************************************************************************/
// Extra material to support the reset hole.
module reset_extra_material() {
  translate([ wall_thickness + reset_button[3]
            , -(wall_thickness + reset_button[4])
            , thickness
            ])
    cylinder(d=reset_button[5]*2, h=inner_height - reset_button[2]);
}

/******************************************************************************/
// Cut out a hole for the reset pin.
module reset_cutout() {
  translate([wall_thickness + reset_button[3], 0, 0])
    union() {
      // Thin hole so you can push the rest button:
      translate([0, -(wall_thickness + reset_button[4]), 0])
        cylinder(d=reset_button[5], h=outer_height);

      // Hole for the reset to rest in:
      translate([ 0
                , -(wall_thickness_no_padding + reset_button[1]/2)
                , thickness + inner_height - reset_button[2]/2
                ])
        cube([ reset_button[0]
             , reset_button[1]
             , reset_button[2]
             ], center=true);
  }
}

/******************************************************************************/
// There's one diode that's along the edge of the board that we need
// to account for:
module edge_diode_cutout() {
  diode_cutout_x = 12.75;
  diode_cutout_y = shelf_width;

  translate([ 19.0 + (diode_cutout_x/2)
            , -85 // FIXME: this should come from the outline array.
            , thickness + inner_height - 0.5
            ])
     rotate([0, 0, 6])
     cube([ diode_cutout_x
          , diode_cutout_y
          , 2
          ], center=true);
}

/******************************************************************************/
module bolts() {
  locations = [
    // Upper-left corner:
    [bolt_inset, -bolt_inset],

    // Upper-right corner:
    [outline[1][0] - bolt_inset, -bolt_inset],

    // Lower-right corner:
    [ outline[3][0] + (outline[2][0] - outline[3][0])/2,
    , outline[3][1] + (outline[2][1] - outline[3][1])/2 + 1.0,
    ],
  ];

  translate([wall_thickness, -wall_thickness , 0]) union() {
    for (i = locations) {
      translate(i) children();
    }
  }
}

/******************************************************************************/
// These are the cutouts.
module case_bolt_holes() {
  hole_height = thickness + inner_height;

  bolts() hull() {
    translate([0, 0, hole_height/2])
      cylinder(d=bolt_shaft, h=hole_height, center=true);
    translate([0, 0, bolt_recess/2])
      cylinder(d=bolt_size[0] + 4.5, h=bolt_recess, center=true);
  }
}

/******************************************************************************/
// Add a little material around the bolt holes so the bolt holes are
// completely encased in material.
module case_bolt_extra_material() {
  height = thickness + inner_height;

  bolts() {
    translate([0, 0, 0])
      cylinder(d=bolt_shaft*1.75, h=height);
  }
}

/******************************************************************************/
module magnet(depth) {
  cylinder(d=magnet_diameter,
           h=max(depth, magnet_depth),
           center=true);
}

/******************************************************************************/
module magnet_holes(width=case_width,
                    height=outer_height + thickness,
                    dir=-1,
                    extra_move=0)
{

  length = thickness;
  middle = width/2;
  x_move = width/2 - length/2 - thickness*2 + extra_move + magnet_depth;

  translate([ 0
            , -(case_y_width/2)
            , height + (((magnet_diameter * 1.10) / 2) * dir)
            ])
    union() {
    translate([middle + x_move, 0, 0])
      rotate([0, 90, 0])
      magnet(length);

    translate([middle - x_move, 0, 0])
      rotate([0, 90, 0])
      magnet(length);
  }
}

/******************************************************************************/
module case() {
  difference() {
    union() {
      // Put the case back on the origin.  All the offsets above moved
      // it around a bit.
      translate([ outer_spacing + wall_thickness_no_padding
                , -(outer_spacing + wall_thickness_no_padding)
                , 0
                ]) { outer_case();
                     inner_case();
                   }

      // Extra material:
      case_bolt_extra_material();
      reset_extra_material();
    }

    // Now cut out some material for various devices:
    pro_micro_cutout();
    trrs_cutout();
    reset_cutout();
    edge_diode_cutout();
    case_bolt_holes();

    // Optional holes for magnets.
    if (feature_magnets)
      magnet_holes(case_width);
  }
}

/******************************************************************************/
module top_studs(cutout=false) {
  height = outer_height + thickness - bolt_recess - 1.0;

  if (cutout) {
    bolts() translate([0, 0, thickness/2])
            cylinder(d=bolt_size[0] - 0.25, h=height + 1.0);
  } else {
    bolts() cylinder(d=bolt_shaft-0.20, h=height);
  }
}

/******************************************************************************/
module keycap_cutout(height, padding=0.75) {
  linear_extrude(height=height)
    offset(delta=padding) // Give some breathing room.
    offset(r=-rounding/2) offset(delta=+rounding/2)
    offset(r=+rounding/2) offset(delta=-rounding/2)
    children();
}

/******************************************************************************/
module thumb_key_cutout(key_shape, key_dims, height) {
  translate([key_dims[0], -key_dims[1], 0])
    rotate([0, 0, key_dims[2]])
    keycap_cutout(height)
    square(size=[ key_shape[0] + key_shape[2]
                , key_shape[1] + key_shape[3]
                ], center=true);
}

/******************************************************************************/
module top_plate() {
  depth = inner_depth - board_thickness - 0.5;
  cut_depth = switch_height;

  // This translate means all measurements made outside the union will
  // be relative to the circuit board.  This makes it easier to make
  // measurements.
  translate([ outer_spacing + wall_thickness_no_padding
            , -(outer_spacing + wall_thickness_no_padding)
            , 0
            ])
    difference() {
      union() {
        // Main plate for the top:
        linear_extrude(height=thickness)
          offset(delta=outer_spacing + thickness)
          offset(r=+rounding) offset(delta=-rounding)
          polygon(points=outline);

        // Ledge that holds the board down.
        difference() {
          translate([0, 0, thickness])
            linear_extrude(height=depth)
            offset(delta=outer_spacing/2)
            polygon(points=outline);

          translate([0, 0, thickness])
            linear_extrude(height=depth)
            offset(delta=-board_overlap)
            polygon(points=outline);
        }
      }

      // Cut out the shapes for the keycaps.
      keycap_cutout(cut_depth) polygon(points=top_cut);
      thumb_key_cutout(cap_2U, thumb_1, cut_depth);
      thumb_key_cutout(cap_1U, thumb_2, cut_depth);
      thumb_key_cutout(cap_1U, thumb_3, cut_depth);
    }
}

/******************************************************************************/
module top() {
  difference() {
    union() {
      top_plate();
      top_studs();
    }

    top_studs(true);
  }
}

/******************************************************************************/
module cover_feet() {
  feet_diameter = thickness;

  linear_extrude(height=cover_outer_height)
    offset(delta=outer_spacing + thickness*2 + feet_diameter)
    offset(r=+rounding) offset(delta=-rounding)
    polygon(points=outline);
}

/******************************************************************************/
module cover_base() {
  // This translate means all measurements made outside the union will
  // be relative to the circuit board.  This makes it easier to make
  // measurements.
  translate([ outer_spacing + wall_thickness_no_padding*2
            , -(outer_spacing + wall_thickness_no_padding*2)
            , 0
            ])
    difference() {
      union() {
        // Outside wall of the cover.
        cover_wall(cover_outer_height);
        cover_feet();
      }

      // Inner ledge that matches up with the cover.
      translate([0, 0, cover_outer_height - cover_wall_height - 0.25])
        linear_extrude(height=cover_wall_height+0.5)
        offset(delta=outer_spacing+thickness+0.25)
        offset(r=+rounding) offset(delta=-rounding)
        polygon(points=outline);

      // Hollow out the space where the keycaps go.
      translate([0, 0, thickness])
        linear_extrude(height=cover_outer_height)
        offset(delta=outer_spacing)
        offset(r=+rounding) offset(delta=-rounding)
        polygon(points=outline);
  }
}

/******************************************************************************/
module cover() {
  cover_width = max([ for (i = outline) i[0] ]) +
    (outer_spacing + thickness*2)*2;

  difference() {
    cover_base();

    if (feature_magnets) {
      magnet_holes(width=cover_width, dir=1,
                   height=cover_outer_height - cover_wall_height,
                   extra_move=thickness + 0.25);
    }
  }
}

/******************************************************************************/
// For test fitting:
module board() {
  board_height = 1.6;

  color("ForestGreen")
    translate([0, 0, board_height + inner_height + thickness])
    linear_extrude(height=board_height)
    polygon(points=outline);
}

/******************************************************************************/
if (print_part == "case") {
  if (print_side == "right") {case();}
  else {mirror([1, 0, 0]) case();}
} else if (print_part == "top") {
  if (print_side == "right") {mirror([1, 0, 0]) top();}
  else {top();}
} else if (print_part == "cover") {
  if (print_side == "right") {mirror([1, 0, 0]) cover();}
  else {cover();}
}
